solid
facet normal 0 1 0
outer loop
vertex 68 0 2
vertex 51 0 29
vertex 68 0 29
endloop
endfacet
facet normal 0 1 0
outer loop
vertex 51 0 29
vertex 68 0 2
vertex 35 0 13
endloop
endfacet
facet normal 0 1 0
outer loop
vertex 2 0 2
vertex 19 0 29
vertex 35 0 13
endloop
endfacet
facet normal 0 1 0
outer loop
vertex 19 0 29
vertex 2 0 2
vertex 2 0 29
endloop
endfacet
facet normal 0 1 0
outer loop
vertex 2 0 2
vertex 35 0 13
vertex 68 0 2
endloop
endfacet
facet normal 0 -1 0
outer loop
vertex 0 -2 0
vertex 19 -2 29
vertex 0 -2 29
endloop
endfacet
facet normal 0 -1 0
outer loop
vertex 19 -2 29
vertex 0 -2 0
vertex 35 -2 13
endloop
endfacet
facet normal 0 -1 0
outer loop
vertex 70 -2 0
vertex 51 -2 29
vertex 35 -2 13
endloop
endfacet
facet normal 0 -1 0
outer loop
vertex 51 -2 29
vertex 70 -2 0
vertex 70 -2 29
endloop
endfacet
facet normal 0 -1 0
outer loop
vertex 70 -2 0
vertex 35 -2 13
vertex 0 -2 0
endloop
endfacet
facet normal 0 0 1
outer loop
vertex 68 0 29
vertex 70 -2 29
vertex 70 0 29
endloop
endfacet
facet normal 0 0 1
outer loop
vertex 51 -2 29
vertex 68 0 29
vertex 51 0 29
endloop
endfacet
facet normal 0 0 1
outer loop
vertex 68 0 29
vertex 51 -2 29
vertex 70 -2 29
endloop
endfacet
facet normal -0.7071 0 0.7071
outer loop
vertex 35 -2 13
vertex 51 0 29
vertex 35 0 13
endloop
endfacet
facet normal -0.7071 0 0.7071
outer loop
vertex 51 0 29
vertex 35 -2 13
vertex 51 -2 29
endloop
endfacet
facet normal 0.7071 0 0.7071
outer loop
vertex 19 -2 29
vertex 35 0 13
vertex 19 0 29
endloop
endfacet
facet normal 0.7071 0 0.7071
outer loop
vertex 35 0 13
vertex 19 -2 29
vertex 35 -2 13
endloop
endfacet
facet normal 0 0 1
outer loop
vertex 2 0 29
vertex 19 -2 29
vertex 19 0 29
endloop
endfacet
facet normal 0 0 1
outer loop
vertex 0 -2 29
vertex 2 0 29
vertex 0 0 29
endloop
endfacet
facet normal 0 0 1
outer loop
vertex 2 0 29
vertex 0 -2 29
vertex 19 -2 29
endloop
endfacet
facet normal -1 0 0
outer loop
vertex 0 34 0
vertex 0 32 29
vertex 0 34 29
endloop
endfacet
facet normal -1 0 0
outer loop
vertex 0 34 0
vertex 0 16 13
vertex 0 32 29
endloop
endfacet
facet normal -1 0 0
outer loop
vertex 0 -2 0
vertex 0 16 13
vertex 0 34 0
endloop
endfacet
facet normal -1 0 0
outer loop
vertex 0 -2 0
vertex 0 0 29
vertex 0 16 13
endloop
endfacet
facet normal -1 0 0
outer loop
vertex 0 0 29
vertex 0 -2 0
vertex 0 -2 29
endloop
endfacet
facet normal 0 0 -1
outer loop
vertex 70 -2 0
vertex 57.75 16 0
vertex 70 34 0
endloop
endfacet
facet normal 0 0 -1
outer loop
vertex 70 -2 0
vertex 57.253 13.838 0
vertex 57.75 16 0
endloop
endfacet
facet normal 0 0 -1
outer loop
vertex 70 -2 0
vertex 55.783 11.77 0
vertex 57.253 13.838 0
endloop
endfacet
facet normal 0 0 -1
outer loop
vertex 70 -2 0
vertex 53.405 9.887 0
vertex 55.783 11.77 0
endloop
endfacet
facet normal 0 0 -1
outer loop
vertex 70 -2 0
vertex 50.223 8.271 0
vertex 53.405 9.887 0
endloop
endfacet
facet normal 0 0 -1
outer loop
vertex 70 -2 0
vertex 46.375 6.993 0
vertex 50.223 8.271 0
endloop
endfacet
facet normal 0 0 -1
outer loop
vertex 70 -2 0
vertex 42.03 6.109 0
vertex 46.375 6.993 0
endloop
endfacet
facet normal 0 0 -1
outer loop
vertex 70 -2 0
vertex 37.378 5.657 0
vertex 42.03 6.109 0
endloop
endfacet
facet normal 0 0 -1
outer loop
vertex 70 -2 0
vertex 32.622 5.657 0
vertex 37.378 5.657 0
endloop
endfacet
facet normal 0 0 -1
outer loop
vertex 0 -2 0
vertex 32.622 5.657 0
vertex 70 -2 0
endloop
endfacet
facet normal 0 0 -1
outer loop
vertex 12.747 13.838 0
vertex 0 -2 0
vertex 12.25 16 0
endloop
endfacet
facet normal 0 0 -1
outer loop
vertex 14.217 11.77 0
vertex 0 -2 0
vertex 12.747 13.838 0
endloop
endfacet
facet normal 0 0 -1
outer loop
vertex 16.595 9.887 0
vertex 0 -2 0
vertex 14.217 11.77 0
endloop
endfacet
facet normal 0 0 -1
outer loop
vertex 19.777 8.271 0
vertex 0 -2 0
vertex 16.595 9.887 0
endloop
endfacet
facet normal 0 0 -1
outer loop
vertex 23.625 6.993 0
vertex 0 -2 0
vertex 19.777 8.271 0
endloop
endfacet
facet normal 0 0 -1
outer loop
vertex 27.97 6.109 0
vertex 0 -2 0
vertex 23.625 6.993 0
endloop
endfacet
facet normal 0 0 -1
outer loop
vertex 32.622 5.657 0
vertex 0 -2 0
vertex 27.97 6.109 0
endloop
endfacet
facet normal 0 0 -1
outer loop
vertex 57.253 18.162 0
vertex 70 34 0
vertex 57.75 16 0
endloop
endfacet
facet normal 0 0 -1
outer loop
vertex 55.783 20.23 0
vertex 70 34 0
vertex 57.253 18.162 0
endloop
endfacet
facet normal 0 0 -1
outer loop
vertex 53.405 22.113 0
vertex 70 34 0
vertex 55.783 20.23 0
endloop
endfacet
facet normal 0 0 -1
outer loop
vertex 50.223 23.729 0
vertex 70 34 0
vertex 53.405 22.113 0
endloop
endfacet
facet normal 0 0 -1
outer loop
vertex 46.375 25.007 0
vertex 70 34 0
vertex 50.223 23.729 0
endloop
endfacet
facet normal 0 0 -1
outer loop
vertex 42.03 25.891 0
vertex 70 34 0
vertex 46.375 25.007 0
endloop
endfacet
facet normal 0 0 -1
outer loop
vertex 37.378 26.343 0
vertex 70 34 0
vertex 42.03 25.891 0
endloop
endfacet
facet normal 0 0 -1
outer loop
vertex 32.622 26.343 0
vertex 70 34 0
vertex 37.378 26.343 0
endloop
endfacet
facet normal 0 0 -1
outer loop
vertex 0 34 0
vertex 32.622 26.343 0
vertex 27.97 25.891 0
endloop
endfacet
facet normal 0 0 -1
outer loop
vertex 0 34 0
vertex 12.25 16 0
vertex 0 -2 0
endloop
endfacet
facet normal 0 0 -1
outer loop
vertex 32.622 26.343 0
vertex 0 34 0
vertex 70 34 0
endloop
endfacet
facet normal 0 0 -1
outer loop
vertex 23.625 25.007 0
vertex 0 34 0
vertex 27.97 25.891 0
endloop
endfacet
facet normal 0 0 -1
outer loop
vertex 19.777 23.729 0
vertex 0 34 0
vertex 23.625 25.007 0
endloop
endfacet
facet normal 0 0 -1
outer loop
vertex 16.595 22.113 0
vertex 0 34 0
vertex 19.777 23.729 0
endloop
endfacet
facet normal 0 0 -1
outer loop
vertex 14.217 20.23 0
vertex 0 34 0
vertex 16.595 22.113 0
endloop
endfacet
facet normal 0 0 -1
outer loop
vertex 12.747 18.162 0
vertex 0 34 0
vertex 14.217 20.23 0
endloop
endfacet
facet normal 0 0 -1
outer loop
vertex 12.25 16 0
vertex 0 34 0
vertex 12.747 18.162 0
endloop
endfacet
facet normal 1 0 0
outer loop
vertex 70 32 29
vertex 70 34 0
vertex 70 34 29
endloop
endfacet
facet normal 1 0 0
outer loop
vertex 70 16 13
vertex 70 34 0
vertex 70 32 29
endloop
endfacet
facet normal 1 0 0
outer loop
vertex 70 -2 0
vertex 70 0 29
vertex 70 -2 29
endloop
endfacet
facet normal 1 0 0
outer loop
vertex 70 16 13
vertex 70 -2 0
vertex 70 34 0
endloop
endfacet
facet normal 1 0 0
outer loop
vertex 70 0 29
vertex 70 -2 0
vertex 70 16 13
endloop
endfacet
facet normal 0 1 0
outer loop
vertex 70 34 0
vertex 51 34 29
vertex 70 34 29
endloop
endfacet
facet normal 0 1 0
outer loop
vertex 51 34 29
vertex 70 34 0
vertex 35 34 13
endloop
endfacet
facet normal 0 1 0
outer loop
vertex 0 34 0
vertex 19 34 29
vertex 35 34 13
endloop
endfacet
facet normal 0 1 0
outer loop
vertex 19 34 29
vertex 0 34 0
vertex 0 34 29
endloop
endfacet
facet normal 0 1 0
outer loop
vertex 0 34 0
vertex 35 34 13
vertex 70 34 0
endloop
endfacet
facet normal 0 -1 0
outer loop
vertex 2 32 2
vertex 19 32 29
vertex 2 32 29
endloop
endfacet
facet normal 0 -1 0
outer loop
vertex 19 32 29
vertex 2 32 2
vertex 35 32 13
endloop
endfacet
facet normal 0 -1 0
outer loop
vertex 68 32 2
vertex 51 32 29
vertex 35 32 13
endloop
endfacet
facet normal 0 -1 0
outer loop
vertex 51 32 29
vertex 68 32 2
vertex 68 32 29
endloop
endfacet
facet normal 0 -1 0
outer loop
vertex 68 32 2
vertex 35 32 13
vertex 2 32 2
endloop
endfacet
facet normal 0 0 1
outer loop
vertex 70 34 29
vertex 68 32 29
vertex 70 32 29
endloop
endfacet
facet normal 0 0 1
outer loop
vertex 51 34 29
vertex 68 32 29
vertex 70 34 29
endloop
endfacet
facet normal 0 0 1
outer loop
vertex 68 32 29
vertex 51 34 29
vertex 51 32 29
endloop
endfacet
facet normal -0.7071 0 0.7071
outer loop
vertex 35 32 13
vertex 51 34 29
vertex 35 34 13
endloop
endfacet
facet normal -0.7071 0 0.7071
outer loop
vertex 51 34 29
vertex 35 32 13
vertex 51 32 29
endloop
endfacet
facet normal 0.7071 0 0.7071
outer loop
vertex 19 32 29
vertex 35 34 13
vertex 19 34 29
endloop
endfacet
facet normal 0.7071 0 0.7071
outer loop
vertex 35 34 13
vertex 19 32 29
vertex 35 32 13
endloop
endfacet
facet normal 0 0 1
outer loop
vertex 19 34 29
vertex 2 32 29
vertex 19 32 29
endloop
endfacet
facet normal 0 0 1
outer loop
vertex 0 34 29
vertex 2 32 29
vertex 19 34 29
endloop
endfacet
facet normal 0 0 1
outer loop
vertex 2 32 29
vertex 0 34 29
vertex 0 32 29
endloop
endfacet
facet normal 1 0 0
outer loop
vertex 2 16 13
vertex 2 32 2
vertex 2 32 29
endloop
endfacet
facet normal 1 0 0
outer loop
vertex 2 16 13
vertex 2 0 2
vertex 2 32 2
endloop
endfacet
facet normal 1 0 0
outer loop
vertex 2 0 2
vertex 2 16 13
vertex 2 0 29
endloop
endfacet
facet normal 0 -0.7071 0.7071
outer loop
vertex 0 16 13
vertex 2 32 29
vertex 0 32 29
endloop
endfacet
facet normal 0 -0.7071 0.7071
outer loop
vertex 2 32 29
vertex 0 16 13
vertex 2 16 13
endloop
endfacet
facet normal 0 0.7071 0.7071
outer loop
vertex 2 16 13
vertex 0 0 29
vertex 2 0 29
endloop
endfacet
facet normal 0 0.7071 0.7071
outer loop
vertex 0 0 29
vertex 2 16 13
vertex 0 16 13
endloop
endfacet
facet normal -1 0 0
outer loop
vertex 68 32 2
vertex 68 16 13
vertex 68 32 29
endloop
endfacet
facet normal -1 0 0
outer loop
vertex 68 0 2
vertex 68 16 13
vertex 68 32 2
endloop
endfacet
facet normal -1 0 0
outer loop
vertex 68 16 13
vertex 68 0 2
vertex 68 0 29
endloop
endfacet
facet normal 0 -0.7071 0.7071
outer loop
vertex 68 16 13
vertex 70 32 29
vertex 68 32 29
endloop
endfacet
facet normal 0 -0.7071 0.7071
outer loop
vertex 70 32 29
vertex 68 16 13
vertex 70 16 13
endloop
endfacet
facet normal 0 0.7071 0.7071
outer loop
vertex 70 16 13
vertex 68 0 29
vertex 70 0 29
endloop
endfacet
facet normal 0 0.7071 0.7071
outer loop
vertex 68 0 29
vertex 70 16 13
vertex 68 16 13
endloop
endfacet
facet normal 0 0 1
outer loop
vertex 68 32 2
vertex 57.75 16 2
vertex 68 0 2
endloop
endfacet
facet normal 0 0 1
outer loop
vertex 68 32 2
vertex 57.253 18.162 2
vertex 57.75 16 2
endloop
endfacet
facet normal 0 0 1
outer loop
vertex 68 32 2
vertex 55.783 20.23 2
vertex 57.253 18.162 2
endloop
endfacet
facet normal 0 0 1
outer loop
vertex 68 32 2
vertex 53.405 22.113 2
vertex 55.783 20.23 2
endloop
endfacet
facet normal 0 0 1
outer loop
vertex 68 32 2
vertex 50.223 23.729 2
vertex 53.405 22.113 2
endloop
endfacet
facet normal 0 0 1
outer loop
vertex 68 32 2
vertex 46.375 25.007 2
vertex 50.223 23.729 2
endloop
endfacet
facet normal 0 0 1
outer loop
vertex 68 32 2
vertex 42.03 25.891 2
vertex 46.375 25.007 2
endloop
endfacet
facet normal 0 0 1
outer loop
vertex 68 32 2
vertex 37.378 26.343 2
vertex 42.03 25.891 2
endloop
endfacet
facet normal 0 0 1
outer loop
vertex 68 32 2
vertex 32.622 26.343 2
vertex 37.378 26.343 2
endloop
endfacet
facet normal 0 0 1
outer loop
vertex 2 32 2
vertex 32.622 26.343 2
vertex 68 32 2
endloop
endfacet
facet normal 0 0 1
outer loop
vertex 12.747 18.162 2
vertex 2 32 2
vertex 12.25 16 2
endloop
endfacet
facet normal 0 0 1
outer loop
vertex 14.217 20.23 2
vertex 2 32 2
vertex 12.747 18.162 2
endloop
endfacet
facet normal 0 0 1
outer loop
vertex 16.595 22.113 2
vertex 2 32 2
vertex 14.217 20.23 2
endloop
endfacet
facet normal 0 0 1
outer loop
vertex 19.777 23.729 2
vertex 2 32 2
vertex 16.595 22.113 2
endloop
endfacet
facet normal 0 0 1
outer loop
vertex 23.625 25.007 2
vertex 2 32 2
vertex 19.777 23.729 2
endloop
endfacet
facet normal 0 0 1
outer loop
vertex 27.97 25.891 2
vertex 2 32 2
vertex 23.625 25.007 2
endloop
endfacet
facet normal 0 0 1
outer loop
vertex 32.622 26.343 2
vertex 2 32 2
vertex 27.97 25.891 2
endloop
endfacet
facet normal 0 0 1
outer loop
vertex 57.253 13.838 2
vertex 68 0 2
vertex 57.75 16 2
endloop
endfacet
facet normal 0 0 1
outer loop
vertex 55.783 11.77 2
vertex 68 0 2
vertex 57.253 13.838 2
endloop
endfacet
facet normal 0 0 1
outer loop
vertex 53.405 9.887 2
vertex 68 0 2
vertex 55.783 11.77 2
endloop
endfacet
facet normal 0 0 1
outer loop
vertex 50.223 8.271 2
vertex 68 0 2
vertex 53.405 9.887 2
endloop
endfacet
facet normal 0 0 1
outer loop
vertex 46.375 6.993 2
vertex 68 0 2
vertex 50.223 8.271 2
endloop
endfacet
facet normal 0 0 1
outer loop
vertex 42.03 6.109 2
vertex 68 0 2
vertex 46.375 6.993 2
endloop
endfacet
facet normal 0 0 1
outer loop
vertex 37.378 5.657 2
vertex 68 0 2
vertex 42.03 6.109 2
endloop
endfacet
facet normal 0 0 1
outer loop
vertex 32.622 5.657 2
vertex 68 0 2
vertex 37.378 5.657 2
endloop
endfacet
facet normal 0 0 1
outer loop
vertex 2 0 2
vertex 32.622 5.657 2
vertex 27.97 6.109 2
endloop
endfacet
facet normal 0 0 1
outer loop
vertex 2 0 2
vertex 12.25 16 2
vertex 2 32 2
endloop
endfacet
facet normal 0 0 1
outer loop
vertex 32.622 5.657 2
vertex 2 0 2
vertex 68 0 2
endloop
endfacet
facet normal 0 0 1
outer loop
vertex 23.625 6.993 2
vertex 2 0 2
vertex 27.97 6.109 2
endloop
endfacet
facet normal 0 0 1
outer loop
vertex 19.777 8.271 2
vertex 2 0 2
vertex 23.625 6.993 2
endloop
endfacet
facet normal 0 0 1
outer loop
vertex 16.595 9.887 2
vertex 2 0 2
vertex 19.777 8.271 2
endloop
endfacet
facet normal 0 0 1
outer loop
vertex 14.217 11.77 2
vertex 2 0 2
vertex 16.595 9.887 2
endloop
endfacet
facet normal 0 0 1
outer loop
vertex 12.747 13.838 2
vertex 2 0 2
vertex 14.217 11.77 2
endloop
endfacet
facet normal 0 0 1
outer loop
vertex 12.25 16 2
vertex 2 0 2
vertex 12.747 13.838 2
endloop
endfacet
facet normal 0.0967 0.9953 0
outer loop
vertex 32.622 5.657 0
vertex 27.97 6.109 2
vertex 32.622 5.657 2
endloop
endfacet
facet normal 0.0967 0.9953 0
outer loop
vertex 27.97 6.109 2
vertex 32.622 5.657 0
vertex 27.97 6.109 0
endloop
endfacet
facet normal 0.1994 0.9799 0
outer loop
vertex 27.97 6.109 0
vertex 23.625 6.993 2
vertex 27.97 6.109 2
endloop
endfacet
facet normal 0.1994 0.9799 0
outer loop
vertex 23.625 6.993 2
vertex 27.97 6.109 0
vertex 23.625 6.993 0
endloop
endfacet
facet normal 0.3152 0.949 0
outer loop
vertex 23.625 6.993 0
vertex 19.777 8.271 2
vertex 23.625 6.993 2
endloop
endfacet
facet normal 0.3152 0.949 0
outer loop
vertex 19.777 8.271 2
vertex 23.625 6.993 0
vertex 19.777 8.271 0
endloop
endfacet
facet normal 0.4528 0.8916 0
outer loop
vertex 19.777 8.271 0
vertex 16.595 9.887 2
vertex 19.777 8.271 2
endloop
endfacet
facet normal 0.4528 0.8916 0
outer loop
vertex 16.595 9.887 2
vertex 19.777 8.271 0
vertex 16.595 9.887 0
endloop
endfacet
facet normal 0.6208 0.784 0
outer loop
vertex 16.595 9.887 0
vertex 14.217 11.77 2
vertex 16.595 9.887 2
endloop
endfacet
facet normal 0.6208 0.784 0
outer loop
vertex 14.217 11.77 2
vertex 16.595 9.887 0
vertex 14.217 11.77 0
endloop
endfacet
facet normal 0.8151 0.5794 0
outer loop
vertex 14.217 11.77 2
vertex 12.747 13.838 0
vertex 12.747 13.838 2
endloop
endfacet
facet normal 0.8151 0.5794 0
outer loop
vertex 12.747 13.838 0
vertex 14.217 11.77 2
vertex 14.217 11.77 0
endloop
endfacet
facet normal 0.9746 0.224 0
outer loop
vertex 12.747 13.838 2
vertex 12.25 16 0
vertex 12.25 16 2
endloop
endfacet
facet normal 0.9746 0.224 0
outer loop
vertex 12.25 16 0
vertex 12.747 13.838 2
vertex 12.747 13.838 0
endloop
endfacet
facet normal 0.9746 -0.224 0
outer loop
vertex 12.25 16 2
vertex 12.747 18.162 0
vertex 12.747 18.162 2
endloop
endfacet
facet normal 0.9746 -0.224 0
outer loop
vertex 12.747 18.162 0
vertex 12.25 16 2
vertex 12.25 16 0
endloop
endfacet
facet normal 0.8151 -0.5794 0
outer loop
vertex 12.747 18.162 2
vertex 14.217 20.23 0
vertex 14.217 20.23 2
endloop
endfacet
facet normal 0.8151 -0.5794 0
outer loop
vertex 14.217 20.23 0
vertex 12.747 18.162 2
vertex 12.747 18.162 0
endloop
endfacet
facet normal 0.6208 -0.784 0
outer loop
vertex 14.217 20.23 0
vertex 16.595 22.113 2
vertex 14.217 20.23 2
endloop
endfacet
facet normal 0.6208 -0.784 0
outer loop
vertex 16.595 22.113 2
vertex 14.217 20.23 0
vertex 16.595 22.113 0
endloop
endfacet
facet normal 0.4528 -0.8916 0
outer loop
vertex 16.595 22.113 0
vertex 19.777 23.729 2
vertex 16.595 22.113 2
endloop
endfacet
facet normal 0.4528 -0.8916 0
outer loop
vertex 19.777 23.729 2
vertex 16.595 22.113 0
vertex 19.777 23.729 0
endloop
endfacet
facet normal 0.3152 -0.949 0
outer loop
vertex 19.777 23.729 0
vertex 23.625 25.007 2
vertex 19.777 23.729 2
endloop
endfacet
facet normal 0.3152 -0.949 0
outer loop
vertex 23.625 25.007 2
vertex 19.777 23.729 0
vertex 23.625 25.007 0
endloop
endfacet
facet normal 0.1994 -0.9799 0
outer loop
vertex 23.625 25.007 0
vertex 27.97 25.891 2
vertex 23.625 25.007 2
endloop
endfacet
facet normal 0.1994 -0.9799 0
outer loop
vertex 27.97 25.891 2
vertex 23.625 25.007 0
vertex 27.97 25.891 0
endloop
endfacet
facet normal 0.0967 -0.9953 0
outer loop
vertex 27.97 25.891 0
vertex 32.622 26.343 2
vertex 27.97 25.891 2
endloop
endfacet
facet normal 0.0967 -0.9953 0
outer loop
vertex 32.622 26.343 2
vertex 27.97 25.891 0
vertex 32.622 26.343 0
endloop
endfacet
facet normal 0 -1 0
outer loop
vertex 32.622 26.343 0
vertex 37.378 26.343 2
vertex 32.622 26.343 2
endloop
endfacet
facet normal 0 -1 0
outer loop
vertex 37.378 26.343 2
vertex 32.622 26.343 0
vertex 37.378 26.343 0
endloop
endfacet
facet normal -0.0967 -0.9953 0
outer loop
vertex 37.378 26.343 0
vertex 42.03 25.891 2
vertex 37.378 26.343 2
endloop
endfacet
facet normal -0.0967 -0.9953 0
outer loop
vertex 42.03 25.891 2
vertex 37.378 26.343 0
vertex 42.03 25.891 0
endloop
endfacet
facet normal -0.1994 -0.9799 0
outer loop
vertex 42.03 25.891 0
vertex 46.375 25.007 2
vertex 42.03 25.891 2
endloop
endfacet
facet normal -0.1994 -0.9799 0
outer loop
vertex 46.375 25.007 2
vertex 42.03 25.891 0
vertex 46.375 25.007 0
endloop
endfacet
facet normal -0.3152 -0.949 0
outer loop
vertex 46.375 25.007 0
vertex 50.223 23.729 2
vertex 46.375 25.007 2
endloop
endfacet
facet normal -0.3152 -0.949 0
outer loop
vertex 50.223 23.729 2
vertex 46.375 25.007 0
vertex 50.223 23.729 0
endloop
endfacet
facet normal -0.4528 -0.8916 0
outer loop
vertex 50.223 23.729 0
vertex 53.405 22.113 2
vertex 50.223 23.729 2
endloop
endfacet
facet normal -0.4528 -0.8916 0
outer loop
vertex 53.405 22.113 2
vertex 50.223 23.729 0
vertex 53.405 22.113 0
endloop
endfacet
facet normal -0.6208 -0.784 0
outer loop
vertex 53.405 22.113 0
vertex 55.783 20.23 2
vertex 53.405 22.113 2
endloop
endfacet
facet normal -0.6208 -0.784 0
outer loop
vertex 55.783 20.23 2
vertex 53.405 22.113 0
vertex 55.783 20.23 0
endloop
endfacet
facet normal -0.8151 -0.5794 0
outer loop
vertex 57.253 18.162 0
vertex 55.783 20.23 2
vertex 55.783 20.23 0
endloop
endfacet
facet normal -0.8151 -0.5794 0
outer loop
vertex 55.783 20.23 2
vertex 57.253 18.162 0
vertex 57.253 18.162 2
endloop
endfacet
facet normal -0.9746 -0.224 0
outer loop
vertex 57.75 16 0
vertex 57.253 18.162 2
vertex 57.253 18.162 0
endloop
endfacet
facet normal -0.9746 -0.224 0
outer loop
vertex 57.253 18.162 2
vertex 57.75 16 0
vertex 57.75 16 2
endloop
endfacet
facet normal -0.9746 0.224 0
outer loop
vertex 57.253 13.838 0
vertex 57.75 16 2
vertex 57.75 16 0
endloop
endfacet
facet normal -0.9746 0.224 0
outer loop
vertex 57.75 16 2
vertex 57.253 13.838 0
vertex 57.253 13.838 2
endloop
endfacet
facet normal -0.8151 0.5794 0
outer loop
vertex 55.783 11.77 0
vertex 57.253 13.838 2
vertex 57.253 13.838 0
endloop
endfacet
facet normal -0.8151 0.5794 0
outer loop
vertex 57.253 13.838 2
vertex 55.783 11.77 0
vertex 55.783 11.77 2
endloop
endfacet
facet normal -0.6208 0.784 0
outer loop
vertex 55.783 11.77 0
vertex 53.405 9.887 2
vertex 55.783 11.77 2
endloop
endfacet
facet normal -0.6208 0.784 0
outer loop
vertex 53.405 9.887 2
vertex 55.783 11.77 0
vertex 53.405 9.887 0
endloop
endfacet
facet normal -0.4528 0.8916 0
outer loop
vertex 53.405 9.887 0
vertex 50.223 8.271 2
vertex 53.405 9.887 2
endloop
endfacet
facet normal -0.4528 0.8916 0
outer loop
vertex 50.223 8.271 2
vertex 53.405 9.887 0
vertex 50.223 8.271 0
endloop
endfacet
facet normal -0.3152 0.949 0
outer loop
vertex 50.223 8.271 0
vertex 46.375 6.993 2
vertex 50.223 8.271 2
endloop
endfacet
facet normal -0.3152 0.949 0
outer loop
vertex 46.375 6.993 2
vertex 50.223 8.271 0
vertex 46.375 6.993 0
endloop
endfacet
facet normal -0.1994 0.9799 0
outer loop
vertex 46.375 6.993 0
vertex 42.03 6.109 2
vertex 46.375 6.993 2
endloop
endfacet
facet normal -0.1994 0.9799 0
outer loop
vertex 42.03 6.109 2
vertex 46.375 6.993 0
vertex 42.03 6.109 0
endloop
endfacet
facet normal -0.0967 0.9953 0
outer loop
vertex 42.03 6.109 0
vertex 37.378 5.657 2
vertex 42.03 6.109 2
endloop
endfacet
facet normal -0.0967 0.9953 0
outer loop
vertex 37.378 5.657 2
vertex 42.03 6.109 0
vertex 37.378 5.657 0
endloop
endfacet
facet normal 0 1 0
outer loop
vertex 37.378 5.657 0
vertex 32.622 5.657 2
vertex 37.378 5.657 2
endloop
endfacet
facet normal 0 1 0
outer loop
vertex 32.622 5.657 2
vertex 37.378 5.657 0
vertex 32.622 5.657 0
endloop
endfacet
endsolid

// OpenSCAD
thickness = 2;
length = 70;
width = 32;
bottomHolePercent = 65;

height = width * 0.75 + 5;
incut = width;
circleDiameter = width * bottomHolePercent / 100;

linear_extrude(height = thickness)
        difference() {
            square([length,width]);
            translate([length/2,width/2]) scale([length/width,1]) circle(circleDiameter/2);
        }

for(i=[0,1]) {
    translate([0,i*(thickness+width),0])
    rotate([90,0,0]) linear_extrude(height = thickness) polygon(points=[[0,0],[0,height],[length/2-incut/2,height],[length/2,height-incut/2],[length/2+incut/2,height],[length,height],[length,0]]);
}

for (i = [0:1]) {
    translate([thickness+i*(length-thickness),0,0]) rotate([0,-90,0])
    linear_extrude(height = thickness) polygon(points=[[0,0],[height,0],[height-width/2,width/2],[height,width],[0,width]]);
}
